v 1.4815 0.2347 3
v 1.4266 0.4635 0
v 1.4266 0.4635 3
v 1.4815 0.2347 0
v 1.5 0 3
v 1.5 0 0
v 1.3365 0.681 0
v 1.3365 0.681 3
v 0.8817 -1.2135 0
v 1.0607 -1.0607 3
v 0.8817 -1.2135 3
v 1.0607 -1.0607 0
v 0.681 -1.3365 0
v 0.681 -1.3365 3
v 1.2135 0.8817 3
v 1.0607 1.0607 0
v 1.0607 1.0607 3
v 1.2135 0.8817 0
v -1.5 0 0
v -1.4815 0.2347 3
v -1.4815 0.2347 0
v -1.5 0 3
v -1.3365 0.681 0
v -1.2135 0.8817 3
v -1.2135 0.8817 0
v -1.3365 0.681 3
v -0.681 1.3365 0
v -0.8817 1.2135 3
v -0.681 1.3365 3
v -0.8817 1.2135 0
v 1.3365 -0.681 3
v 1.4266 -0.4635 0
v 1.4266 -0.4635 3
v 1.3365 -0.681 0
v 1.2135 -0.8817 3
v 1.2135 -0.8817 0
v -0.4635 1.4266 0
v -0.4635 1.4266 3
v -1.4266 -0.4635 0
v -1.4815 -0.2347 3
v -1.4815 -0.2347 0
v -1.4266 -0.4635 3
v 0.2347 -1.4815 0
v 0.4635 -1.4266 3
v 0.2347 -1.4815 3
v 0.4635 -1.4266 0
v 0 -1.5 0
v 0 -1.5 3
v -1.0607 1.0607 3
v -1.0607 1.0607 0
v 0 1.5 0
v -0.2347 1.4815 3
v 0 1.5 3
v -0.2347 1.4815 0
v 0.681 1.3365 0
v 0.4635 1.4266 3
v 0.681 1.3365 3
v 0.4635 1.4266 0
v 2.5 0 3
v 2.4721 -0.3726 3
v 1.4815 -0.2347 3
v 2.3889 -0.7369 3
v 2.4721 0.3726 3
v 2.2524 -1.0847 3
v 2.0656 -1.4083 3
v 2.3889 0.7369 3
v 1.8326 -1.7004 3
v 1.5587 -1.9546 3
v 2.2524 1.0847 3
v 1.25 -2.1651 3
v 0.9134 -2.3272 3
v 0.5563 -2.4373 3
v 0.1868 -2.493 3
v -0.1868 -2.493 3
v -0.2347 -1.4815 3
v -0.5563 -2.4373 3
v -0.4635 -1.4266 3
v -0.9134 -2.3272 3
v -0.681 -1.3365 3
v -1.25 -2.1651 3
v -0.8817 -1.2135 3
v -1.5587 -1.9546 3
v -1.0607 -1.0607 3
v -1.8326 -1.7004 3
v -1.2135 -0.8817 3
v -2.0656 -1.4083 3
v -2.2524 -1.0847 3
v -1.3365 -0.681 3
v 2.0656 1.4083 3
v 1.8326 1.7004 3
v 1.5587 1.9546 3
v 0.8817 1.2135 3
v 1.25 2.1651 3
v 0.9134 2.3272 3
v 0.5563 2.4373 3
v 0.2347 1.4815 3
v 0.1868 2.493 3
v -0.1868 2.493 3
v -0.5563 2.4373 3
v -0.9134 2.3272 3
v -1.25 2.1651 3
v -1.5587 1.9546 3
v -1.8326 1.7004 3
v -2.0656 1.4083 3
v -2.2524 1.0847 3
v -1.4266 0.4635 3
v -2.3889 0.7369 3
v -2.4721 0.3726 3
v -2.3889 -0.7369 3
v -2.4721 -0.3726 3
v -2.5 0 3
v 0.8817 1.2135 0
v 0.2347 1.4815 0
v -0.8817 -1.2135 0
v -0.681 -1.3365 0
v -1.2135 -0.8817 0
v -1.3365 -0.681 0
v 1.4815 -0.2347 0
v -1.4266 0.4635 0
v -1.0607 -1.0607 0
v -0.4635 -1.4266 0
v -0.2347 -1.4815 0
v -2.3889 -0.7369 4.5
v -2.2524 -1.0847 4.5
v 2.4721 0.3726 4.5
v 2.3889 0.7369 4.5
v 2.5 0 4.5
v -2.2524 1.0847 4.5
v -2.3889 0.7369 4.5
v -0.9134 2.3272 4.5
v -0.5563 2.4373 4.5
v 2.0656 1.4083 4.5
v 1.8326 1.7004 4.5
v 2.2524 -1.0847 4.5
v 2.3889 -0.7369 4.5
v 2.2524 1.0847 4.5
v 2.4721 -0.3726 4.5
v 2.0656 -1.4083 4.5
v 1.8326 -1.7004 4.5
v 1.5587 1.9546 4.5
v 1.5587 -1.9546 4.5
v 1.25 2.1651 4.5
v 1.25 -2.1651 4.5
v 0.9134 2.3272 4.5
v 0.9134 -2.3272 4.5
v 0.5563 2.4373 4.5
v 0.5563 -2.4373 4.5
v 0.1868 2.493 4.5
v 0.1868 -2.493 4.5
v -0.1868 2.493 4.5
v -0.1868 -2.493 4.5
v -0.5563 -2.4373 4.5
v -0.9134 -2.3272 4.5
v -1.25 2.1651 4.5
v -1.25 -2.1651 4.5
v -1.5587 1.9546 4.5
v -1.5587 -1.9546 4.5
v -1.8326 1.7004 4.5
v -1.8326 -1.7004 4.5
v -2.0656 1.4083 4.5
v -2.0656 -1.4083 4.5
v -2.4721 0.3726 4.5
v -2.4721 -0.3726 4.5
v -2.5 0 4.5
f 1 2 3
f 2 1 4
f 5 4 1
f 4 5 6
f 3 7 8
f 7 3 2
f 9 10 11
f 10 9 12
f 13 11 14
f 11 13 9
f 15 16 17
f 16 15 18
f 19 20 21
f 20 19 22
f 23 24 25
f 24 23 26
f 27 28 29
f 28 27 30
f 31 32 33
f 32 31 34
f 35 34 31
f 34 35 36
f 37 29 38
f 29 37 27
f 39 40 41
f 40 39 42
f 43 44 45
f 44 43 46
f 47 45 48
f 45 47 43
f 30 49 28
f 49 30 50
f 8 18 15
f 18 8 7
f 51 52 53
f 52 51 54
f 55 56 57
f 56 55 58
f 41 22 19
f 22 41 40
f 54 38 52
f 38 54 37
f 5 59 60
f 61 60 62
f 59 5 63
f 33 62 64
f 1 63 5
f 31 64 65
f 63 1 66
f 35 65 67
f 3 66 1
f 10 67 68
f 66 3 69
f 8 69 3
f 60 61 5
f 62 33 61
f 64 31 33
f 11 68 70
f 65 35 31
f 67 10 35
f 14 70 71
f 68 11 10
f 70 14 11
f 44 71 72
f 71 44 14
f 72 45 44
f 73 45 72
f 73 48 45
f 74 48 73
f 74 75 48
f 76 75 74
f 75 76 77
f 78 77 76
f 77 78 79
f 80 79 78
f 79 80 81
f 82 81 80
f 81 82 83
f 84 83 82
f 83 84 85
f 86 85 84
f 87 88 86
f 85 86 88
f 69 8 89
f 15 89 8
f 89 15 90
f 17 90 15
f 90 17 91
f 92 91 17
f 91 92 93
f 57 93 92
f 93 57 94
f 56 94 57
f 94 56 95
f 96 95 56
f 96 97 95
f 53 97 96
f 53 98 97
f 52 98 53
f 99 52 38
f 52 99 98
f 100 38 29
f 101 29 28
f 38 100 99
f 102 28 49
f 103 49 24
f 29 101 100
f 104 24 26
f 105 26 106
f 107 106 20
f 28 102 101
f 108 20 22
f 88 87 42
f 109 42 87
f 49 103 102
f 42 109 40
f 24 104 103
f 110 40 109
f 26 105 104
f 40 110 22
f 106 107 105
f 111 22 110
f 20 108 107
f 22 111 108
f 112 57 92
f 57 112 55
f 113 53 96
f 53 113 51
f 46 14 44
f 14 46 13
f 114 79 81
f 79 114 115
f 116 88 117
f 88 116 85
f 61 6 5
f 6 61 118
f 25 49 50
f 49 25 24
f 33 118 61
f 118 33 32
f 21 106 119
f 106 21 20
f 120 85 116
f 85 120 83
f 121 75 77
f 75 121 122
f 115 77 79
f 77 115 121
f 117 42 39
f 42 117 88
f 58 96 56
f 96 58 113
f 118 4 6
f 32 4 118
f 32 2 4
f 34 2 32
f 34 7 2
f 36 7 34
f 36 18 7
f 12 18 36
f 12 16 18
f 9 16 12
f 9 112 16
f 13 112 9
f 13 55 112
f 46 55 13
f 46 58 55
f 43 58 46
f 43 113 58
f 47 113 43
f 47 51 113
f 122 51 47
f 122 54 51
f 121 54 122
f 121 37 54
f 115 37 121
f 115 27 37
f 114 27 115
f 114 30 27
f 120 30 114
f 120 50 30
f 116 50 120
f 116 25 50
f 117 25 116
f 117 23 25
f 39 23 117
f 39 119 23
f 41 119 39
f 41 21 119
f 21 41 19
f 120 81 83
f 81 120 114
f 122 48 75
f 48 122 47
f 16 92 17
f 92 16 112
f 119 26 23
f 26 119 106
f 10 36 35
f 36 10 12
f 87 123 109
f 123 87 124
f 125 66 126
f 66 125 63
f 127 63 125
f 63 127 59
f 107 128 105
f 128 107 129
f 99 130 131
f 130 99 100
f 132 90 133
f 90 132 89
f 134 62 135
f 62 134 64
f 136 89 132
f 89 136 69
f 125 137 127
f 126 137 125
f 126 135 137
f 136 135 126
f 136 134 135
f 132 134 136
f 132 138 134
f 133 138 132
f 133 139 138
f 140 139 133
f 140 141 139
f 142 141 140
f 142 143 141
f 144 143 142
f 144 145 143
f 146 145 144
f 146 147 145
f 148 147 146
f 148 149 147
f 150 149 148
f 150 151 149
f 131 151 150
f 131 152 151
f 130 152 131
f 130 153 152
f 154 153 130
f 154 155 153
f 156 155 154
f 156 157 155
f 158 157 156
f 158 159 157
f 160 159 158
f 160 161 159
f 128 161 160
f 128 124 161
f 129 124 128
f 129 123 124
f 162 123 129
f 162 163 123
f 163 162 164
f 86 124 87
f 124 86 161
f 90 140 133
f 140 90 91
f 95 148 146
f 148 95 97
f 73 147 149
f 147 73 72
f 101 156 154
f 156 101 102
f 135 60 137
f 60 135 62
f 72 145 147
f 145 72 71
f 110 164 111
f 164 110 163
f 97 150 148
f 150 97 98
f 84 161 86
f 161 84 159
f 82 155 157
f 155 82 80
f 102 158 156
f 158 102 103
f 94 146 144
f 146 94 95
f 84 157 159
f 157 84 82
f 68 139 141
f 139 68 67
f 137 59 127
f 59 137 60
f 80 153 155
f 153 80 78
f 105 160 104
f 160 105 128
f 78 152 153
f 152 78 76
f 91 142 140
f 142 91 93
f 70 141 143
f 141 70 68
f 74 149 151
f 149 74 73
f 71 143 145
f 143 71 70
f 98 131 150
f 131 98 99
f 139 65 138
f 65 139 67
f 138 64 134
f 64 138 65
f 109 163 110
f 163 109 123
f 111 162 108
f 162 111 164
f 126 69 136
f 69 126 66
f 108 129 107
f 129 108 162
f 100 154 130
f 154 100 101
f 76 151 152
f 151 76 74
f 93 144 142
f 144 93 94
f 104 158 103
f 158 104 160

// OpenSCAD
// part_id: cp4
// name: Stopper D3 L3
// source_drawing_ids: DRW-005
// units: mm
// revision: 0.1
// SPDX-License-Identifier: MIT

module part_cp4(core_d = 3.0, core_h = 3.0, flange_d = 5.0, flange_h = 1.5, neck_d = 2.0, neck_h = 1.5) {
    union() {
        cylinder(d = core_d, h = core_h, center = false, $fn = 40);
        translate([0, 0, core_h]) cylinder(d = flange_d, h = flange_h, center = false, $fn = 42);
        translate([0, 0, 0]) cylinder(d = neck_d, h = neck_h, center = false, $fn = 30);
    }
}

// ---- "main guard" ----
// Default to previewing when opened directly:
if (is_undef(__LIB_MODE__)) {
    part_cp4();
}
